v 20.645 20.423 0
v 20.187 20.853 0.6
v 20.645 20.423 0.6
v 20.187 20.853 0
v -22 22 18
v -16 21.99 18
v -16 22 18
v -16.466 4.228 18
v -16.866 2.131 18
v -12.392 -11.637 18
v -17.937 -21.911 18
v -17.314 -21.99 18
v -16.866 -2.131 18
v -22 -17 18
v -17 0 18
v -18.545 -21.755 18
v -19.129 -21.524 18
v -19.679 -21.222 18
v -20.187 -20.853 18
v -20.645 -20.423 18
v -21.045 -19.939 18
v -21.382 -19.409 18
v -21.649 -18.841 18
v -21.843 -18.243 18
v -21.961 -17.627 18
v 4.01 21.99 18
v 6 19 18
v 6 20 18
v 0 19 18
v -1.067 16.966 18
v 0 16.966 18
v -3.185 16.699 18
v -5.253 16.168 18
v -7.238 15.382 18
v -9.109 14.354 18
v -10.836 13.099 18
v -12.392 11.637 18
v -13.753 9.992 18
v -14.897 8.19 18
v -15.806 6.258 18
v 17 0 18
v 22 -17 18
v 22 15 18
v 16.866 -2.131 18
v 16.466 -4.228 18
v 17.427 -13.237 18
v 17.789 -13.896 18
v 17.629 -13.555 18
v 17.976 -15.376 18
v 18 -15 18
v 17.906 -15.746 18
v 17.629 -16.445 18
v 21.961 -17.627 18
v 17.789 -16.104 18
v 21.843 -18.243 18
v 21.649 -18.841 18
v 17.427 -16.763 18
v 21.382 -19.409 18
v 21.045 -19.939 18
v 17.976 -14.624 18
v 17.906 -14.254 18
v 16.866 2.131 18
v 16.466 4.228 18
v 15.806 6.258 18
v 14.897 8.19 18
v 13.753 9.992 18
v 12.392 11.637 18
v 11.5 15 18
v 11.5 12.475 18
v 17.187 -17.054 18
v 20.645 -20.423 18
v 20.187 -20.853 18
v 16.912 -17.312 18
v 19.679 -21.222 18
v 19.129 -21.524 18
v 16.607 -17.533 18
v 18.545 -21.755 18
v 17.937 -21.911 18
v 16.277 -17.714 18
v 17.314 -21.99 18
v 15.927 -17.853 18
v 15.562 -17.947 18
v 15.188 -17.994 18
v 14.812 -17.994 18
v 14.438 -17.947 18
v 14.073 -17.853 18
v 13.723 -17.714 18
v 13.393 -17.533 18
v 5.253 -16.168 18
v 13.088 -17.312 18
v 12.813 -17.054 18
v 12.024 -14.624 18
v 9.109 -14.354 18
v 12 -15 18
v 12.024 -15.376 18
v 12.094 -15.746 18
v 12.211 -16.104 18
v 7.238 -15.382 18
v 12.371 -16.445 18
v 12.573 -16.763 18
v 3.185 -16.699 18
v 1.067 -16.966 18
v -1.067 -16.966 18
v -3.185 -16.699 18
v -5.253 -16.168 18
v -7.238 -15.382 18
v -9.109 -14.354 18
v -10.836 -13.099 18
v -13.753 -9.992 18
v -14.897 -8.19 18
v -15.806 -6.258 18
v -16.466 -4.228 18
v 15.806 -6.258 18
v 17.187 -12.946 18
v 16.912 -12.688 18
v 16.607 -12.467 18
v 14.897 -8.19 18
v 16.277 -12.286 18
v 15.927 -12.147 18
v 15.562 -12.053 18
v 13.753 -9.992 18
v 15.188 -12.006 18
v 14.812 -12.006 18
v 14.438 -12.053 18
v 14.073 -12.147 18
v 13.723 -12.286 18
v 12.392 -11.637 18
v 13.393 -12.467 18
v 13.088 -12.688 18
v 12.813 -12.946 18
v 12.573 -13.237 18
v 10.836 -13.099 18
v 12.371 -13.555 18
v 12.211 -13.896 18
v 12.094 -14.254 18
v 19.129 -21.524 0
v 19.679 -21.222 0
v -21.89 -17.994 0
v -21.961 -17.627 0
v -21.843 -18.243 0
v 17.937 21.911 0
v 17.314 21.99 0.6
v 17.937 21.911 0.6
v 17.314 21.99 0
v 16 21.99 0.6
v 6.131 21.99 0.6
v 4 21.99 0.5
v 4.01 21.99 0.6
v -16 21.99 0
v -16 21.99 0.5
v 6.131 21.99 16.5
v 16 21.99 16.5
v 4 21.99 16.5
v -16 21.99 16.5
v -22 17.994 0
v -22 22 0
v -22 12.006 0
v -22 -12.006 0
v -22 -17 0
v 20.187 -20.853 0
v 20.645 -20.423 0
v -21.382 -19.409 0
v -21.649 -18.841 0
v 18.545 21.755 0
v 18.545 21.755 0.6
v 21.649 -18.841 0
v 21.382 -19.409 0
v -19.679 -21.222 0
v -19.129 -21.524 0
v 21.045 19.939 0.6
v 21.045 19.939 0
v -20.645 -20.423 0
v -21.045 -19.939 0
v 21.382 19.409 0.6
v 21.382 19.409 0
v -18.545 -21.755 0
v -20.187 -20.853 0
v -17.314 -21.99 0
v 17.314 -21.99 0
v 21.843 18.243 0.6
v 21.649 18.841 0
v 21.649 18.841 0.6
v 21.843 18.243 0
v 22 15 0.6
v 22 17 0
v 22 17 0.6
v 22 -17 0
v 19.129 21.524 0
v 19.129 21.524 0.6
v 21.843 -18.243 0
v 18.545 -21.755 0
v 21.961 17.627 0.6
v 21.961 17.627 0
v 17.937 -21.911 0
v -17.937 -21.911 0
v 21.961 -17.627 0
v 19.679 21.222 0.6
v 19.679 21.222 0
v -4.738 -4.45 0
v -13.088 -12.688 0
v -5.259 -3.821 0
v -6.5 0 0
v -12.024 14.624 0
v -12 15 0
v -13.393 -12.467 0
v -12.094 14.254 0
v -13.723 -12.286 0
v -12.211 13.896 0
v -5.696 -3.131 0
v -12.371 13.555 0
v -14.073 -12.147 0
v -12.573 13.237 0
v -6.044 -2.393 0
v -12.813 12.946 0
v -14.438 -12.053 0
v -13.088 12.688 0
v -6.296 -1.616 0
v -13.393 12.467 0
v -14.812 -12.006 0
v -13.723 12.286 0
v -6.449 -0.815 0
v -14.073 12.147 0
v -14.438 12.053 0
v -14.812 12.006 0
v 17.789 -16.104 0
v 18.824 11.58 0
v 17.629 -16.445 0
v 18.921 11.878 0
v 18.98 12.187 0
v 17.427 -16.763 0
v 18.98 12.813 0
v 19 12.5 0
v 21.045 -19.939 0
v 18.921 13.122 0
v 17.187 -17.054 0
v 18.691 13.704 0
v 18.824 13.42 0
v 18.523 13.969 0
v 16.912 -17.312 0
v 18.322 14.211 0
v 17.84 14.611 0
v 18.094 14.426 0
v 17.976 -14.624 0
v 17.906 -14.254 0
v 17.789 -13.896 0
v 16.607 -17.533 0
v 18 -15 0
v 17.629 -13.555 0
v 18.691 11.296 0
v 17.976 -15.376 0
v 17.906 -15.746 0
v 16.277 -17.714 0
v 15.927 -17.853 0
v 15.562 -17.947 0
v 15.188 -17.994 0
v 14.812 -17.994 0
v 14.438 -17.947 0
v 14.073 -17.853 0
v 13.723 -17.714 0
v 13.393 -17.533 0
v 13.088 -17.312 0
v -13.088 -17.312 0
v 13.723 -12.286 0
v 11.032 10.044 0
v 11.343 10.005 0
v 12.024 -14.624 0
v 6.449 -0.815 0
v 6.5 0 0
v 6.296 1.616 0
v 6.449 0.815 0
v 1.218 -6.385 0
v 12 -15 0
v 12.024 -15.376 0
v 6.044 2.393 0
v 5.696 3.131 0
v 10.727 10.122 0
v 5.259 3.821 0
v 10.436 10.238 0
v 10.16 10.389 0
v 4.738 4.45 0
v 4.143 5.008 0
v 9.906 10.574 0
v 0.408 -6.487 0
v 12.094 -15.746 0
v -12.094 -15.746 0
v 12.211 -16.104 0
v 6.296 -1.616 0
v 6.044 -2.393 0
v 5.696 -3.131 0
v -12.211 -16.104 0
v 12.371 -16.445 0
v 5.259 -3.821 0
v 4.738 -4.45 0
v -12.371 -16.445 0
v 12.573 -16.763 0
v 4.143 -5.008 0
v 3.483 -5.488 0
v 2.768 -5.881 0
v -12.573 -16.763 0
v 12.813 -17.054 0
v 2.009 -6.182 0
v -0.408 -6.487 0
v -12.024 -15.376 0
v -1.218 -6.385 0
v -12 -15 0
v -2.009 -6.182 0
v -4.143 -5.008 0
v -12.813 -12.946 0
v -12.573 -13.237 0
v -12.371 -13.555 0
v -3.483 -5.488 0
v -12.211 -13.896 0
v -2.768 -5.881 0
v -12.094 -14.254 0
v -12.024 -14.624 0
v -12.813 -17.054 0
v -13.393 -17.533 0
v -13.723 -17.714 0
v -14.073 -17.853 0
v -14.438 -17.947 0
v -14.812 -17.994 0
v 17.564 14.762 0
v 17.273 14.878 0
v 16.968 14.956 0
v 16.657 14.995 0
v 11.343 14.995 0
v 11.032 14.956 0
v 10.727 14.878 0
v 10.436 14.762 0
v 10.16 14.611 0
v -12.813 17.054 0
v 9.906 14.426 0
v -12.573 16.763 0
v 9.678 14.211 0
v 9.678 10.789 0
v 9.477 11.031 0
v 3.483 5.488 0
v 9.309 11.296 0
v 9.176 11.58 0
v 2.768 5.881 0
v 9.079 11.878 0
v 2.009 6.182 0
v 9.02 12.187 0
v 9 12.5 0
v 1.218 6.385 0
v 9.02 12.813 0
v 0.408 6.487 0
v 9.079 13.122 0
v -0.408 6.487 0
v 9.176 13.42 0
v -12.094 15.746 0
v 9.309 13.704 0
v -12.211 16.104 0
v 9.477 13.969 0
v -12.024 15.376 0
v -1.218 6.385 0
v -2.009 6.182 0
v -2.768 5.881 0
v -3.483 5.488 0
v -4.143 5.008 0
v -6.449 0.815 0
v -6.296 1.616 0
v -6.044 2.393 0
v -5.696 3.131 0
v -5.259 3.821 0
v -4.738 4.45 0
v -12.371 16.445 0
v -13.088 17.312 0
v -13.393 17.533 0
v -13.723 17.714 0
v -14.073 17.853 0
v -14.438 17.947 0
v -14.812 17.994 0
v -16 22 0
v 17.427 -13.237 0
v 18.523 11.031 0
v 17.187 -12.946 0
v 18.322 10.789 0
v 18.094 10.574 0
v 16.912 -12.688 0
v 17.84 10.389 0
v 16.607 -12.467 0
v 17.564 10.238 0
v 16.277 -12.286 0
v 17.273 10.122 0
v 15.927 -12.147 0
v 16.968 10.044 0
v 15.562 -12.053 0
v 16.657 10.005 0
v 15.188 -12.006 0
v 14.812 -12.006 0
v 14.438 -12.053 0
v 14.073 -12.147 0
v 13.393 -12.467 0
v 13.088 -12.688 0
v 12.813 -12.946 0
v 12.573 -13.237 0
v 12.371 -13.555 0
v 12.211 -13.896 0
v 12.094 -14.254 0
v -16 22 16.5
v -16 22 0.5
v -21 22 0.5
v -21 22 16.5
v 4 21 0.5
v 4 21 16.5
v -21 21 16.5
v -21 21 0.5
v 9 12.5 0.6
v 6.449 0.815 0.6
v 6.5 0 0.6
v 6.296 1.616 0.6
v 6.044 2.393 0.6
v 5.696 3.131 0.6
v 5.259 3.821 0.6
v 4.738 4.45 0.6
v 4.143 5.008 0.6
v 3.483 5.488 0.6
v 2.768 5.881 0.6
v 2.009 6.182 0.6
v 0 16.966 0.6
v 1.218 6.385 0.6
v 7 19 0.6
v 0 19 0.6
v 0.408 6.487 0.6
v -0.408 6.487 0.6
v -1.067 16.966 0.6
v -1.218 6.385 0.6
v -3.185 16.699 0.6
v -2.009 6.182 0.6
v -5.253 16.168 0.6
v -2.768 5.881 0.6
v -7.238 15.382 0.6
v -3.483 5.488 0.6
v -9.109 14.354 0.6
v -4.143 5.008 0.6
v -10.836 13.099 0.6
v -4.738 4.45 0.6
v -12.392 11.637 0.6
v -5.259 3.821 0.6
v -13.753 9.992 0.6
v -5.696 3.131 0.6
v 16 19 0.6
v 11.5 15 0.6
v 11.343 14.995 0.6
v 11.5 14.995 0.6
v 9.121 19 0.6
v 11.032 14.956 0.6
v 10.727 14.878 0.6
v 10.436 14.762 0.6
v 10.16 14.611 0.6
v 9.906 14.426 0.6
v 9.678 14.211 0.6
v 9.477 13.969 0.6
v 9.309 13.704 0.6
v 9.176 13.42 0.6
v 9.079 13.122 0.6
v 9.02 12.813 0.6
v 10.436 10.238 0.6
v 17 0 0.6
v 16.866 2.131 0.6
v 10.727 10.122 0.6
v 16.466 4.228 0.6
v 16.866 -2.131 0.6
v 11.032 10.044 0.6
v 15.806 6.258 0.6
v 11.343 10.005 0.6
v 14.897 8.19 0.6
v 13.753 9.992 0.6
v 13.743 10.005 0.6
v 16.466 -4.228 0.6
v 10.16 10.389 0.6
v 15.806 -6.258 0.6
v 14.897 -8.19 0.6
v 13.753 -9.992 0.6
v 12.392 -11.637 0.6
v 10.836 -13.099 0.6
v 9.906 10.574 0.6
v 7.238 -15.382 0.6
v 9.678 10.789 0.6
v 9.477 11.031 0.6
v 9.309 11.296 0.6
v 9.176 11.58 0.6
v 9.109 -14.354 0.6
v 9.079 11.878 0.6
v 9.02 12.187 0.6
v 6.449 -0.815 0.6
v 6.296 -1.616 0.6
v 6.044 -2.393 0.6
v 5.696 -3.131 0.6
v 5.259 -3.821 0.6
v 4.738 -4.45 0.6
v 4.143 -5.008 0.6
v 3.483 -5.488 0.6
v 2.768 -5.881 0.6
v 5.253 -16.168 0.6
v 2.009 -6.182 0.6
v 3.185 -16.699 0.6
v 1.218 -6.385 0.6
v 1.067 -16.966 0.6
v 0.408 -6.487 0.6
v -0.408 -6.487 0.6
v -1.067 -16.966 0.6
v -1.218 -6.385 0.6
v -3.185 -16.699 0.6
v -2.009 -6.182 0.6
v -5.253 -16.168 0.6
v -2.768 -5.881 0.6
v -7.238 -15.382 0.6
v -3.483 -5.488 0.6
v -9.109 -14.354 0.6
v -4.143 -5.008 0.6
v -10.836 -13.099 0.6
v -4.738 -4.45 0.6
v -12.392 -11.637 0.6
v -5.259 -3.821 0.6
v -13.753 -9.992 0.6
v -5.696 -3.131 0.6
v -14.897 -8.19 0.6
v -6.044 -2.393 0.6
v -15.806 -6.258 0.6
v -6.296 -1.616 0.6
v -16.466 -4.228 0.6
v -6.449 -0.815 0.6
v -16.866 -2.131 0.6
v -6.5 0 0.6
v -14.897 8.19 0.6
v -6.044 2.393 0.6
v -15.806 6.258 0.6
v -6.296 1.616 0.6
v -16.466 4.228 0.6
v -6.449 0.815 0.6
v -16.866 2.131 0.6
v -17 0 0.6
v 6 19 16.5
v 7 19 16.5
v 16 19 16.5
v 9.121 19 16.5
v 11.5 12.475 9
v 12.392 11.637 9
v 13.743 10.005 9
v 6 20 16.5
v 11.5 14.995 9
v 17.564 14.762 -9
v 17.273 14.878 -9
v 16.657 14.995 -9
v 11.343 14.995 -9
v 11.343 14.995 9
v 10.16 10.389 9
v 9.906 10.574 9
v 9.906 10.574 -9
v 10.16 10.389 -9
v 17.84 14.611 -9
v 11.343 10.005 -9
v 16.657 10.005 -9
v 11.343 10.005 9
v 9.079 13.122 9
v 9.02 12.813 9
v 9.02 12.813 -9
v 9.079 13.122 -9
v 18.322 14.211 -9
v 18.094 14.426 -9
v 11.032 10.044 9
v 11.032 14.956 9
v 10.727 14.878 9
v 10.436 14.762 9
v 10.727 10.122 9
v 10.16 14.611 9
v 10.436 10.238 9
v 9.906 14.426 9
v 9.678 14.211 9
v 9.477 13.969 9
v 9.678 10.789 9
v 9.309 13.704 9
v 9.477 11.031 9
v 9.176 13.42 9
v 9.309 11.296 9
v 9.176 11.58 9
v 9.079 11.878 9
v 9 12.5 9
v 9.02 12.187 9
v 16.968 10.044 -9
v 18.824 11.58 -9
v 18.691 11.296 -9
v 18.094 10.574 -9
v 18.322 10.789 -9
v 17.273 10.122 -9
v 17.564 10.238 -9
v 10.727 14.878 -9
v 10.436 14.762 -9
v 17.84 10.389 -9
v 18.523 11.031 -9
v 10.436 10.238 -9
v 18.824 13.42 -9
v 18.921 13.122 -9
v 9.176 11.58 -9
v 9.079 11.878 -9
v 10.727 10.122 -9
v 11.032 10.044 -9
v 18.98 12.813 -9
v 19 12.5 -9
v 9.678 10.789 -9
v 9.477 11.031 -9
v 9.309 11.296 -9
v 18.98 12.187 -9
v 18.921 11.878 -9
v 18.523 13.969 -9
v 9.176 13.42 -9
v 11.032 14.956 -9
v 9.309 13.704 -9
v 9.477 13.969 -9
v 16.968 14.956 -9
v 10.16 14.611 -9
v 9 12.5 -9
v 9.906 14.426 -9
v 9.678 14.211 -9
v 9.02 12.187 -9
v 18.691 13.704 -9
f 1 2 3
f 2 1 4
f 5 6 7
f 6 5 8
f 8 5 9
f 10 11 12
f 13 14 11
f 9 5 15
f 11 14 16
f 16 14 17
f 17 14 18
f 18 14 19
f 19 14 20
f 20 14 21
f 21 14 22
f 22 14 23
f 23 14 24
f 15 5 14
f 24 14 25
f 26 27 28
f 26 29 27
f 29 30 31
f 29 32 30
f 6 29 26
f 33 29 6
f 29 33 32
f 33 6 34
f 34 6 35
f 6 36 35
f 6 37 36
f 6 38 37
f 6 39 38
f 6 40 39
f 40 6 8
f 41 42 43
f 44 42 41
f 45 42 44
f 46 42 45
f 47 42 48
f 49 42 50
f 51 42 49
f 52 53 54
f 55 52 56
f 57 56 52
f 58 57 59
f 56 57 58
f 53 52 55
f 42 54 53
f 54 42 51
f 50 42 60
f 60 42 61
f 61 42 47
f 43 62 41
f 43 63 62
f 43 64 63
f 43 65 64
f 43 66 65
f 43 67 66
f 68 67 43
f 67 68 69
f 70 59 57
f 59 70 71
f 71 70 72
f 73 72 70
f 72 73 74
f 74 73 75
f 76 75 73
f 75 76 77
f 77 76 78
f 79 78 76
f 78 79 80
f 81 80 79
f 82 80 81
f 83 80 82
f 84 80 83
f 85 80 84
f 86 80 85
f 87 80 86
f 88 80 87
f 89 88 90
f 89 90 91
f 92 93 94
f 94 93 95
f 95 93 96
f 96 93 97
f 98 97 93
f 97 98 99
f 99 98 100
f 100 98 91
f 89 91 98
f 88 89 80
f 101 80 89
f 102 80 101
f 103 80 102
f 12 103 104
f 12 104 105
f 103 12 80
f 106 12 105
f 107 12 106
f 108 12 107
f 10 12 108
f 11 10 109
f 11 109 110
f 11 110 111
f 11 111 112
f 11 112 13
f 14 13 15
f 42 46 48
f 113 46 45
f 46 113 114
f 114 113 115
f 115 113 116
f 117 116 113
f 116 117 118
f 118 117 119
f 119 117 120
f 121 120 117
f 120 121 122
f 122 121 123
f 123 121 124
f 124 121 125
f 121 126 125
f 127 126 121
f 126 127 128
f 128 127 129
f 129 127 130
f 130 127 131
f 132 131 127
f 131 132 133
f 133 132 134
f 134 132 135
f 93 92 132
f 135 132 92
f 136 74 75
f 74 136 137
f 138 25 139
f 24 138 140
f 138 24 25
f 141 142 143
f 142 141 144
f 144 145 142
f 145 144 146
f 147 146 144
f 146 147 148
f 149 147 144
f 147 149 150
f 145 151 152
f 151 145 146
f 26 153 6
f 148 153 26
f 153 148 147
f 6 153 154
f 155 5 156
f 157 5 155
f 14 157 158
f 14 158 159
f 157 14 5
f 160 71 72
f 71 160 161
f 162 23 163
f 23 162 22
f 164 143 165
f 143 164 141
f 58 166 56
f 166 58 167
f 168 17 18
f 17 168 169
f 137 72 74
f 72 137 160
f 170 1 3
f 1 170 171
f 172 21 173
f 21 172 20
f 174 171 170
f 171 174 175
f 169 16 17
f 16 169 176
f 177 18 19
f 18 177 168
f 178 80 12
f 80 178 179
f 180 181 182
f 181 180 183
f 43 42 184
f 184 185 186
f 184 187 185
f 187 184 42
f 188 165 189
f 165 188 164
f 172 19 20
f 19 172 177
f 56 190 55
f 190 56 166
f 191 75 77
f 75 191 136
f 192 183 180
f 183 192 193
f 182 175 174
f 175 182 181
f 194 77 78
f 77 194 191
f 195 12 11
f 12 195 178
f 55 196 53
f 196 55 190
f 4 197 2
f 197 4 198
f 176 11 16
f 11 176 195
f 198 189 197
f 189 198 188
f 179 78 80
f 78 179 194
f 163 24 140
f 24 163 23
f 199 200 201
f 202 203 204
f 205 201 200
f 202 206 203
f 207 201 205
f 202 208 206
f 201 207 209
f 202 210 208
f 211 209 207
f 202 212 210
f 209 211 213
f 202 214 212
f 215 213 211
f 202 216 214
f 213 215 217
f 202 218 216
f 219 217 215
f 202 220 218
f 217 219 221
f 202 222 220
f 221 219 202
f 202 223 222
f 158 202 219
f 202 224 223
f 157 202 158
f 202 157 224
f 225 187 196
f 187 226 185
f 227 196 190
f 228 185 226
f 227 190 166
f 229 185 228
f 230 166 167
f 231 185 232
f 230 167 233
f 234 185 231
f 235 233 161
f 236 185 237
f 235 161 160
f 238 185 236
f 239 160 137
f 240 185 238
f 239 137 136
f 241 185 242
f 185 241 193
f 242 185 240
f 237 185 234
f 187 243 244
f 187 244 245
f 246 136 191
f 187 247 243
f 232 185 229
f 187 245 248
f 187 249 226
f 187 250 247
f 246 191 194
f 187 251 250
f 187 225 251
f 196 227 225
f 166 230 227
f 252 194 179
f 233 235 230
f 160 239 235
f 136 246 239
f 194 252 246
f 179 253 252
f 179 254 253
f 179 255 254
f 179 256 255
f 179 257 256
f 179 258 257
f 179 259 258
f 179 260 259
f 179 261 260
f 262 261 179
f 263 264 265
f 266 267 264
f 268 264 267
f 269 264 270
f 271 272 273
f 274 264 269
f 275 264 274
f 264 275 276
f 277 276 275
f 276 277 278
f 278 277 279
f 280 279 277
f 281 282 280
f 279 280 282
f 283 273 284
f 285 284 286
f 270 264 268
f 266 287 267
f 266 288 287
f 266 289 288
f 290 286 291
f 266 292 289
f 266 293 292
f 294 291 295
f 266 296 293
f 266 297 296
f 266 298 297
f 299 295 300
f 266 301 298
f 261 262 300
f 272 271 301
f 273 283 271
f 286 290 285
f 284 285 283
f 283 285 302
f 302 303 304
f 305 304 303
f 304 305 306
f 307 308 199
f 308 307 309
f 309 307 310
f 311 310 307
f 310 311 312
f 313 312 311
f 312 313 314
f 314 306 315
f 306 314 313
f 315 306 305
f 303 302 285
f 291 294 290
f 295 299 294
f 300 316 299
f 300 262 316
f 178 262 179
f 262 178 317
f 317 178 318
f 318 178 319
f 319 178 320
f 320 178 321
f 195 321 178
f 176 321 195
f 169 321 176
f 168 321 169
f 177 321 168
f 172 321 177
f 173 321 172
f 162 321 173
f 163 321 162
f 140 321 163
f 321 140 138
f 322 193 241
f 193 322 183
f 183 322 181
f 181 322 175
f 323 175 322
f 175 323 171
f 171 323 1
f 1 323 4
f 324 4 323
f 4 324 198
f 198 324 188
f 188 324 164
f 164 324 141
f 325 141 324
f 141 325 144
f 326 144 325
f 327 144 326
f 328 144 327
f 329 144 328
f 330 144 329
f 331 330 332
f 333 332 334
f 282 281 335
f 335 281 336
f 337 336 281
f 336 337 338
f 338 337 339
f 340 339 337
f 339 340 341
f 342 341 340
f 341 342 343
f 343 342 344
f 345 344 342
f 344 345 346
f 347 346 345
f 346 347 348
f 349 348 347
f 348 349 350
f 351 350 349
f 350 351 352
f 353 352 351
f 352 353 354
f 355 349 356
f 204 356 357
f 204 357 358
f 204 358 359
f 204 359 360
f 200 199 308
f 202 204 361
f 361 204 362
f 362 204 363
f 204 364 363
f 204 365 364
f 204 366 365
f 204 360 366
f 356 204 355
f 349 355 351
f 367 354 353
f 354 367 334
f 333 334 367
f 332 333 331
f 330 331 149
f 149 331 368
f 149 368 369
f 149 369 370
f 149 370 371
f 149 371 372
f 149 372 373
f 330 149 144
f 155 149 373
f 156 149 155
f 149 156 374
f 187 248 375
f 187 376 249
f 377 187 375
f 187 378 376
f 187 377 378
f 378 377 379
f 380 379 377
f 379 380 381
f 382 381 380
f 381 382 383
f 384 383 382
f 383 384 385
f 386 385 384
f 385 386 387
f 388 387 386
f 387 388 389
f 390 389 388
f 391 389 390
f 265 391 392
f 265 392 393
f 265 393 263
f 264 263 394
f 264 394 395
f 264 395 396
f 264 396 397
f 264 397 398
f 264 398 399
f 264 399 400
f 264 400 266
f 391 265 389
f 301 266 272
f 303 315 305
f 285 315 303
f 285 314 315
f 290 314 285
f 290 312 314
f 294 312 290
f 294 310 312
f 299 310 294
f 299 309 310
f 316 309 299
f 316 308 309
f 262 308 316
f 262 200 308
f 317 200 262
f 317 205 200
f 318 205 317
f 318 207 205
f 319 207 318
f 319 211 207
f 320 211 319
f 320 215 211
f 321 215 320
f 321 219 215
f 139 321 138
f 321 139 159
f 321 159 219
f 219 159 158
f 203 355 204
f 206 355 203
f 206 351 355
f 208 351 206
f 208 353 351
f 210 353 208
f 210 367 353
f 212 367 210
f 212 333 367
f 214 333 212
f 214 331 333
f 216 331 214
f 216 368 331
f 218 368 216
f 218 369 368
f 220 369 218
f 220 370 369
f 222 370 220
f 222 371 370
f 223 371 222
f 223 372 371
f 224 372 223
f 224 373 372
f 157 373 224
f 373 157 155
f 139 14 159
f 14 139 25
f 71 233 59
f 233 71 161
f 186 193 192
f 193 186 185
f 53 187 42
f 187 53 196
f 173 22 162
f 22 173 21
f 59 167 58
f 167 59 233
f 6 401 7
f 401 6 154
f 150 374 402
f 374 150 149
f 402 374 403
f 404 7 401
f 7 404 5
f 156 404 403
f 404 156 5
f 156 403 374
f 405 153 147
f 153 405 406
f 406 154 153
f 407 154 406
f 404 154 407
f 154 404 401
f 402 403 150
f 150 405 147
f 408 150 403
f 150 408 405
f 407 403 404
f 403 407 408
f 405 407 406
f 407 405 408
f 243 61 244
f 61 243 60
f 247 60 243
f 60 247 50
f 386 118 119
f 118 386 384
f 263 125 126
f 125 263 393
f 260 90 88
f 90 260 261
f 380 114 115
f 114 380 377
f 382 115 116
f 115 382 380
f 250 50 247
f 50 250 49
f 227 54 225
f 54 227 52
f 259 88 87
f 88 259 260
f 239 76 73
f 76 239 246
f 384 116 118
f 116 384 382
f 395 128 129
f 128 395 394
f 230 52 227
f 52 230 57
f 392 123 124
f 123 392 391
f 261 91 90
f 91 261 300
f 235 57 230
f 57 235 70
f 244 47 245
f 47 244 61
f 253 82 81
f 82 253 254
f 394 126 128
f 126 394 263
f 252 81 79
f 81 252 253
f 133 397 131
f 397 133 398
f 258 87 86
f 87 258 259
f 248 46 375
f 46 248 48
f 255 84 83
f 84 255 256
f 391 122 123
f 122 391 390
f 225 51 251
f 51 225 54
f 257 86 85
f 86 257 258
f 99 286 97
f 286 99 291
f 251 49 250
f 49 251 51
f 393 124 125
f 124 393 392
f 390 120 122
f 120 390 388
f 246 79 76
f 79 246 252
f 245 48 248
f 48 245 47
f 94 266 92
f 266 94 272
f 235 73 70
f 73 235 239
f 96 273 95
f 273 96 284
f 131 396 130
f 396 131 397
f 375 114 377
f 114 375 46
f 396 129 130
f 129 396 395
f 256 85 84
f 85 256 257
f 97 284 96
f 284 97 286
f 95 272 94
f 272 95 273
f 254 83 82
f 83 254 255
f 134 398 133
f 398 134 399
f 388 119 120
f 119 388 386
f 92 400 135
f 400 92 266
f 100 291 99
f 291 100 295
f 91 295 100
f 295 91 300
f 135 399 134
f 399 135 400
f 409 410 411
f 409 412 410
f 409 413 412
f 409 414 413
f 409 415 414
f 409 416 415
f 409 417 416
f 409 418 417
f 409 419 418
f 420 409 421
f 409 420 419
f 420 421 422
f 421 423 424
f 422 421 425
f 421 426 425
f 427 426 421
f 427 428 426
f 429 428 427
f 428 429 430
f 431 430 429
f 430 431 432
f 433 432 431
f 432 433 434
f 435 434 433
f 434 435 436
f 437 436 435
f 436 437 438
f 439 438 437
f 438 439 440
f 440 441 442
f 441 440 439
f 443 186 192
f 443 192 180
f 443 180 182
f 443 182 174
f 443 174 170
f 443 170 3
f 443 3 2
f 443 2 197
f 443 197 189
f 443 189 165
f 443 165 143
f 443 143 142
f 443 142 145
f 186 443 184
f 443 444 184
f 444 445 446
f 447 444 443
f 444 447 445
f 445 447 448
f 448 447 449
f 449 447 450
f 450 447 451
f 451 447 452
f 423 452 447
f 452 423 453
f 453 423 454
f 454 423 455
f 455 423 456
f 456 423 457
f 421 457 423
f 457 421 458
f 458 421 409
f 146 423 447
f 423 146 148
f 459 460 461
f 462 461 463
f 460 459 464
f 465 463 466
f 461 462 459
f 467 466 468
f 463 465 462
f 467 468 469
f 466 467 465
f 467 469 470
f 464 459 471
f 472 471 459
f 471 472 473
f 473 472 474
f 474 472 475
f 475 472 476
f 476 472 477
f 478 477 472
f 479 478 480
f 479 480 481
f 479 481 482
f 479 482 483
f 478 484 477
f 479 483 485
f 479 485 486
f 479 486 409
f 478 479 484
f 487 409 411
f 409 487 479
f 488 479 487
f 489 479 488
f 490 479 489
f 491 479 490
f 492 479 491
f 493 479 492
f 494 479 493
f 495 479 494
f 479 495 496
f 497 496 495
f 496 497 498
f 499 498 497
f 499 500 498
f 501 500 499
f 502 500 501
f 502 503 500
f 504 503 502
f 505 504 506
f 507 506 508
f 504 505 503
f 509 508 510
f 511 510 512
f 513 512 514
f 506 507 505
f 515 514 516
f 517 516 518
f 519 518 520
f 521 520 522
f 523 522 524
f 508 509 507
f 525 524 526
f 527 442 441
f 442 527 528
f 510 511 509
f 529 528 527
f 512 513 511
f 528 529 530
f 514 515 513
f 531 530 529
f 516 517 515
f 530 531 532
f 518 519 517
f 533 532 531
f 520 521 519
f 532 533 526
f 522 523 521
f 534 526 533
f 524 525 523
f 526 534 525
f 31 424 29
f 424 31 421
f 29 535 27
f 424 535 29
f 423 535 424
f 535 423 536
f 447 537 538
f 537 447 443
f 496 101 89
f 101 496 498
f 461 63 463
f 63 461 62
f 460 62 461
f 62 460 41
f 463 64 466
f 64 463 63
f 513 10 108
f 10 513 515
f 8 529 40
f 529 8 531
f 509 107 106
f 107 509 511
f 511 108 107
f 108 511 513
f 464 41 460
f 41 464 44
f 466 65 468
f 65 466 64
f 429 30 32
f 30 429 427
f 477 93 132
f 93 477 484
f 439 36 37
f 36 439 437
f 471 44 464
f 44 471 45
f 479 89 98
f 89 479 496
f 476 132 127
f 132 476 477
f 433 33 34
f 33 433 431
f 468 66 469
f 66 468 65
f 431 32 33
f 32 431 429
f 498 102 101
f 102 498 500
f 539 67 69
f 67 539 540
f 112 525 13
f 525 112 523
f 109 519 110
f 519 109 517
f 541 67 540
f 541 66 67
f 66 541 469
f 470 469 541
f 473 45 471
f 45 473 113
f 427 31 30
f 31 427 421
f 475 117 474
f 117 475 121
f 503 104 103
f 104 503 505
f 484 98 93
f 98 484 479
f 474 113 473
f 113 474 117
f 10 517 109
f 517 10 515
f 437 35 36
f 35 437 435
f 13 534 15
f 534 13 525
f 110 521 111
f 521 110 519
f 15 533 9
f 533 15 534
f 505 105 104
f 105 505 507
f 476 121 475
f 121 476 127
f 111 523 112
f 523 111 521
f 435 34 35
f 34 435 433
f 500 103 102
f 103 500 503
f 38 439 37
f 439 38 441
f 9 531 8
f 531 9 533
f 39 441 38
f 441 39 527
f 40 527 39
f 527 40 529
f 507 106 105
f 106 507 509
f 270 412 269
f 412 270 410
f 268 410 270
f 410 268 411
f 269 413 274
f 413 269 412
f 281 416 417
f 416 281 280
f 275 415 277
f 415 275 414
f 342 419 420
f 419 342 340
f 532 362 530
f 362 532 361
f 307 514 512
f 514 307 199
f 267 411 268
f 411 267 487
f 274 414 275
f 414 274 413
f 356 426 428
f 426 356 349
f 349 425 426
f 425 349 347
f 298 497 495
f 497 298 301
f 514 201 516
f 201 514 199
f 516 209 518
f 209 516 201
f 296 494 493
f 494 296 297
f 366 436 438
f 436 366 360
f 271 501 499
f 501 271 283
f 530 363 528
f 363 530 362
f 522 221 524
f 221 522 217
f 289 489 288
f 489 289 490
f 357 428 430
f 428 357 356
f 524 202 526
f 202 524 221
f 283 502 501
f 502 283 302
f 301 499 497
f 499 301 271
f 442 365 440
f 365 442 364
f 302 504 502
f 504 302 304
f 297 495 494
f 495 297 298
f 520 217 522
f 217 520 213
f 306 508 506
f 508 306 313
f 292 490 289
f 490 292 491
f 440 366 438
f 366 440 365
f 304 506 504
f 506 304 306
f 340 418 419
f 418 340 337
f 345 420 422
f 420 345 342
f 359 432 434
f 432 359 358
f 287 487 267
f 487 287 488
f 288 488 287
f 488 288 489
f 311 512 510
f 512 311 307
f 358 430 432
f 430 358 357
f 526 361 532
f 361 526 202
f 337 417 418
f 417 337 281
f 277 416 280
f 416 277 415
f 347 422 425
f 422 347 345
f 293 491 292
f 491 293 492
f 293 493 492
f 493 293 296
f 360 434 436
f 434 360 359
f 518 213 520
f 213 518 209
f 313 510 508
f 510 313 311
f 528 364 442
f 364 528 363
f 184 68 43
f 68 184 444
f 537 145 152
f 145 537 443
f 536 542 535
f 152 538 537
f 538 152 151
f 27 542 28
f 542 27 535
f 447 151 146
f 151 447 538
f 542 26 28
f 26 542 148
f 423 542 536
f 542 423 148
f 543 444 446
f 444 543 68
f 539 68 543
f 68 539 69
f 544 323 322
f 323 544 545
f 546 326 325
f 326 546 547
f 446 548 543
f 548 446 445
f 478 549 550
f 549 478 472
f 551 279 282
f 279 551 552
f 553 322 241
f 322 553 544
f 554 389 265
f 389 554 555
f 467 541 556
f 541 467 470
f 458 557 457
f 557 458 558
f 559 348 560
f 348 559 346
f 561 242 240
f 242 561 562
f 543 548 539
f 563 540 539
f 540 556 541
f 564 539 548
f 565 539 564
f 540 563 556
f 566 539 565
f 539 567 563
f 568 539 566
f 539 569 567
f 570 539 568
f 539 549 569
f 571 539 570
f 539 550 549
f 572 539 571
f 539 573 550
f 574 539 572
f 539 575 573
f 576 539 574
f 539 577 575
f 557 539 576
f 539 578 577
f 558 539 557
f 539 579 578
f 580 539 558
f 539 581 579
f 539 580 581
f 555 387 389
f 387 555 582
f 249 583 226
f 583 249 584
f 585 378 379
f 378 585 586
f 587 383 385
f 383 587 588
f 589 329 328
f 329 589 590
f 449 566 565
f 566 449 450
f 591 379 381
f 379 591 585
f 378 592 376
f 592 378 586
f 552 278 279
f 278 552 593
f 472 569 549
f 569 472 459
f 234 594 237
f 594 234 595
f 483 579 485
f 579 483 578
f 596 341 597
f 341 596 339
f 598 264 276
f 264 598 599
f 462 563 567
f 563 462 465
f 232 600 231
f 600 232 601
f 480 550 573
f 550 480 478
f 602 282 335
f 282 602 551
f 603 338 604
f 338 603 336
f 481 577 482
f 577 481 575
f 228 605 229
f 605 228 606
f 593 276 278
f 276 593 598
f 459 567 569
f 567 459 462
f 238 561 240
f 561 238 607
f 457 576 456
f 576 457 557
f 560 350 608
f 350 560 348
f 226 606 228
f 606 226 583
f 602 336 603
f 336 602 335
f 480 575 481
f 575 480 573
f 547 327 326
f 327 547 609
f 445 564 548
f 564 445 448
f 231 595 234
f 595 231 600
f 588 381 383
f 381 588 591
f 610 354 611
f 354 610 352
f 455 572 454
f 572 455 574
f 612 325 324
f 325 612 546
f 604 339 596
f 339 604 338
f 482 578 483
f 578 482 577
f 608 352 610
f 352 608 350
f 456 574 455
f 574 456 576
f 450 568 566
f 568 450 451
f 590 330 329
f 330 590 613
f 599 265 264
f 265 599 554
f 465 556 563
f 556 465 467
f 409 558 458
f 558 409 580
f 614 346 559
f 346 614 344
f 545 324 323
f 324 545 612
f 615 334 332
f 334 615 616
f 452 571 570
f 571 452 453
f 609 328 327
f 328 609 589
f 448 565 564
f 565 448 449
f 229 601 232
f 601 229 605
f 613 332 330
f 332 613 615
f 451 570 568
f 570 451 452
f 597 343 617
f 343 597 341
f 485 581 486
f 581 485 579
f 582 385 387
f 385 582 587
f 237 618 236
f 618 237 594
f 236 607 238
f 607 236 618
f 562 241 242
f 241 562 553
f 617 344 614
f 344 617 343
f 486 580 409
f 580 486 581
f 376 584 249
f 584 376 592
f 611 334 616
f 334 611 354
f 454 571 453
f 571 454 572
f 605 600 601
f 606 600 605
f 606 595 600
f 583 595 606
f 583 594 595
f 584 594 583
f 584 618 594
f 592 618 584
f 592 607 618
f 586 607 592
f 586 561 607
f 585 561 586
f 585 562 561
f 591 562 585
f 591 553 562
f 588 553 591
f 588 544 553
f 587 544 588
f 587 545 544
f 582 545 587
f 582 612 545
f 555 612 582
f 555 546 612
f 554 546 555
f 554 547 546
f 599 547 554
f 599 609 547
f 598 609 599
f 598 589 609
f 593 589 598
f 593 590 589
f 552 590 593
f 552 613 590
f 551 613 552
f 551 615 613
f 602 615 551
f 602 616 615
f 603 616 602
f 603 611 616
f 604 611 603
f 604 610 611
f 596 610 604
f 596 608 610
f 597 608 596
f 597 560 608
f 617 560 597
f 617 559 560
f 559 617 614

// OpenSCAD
$fn = 50;


union() {
	difference() {
		union() {
			hull() {
				translate(v = [-17.0000000000, 17.0000000000, 0]) {
					cylinder(h = 18, r = 5);
				}
				translate(v = [17.0000000000, 17.0000000000, 0]) {
					cylinder(h = 18, r = 5);
				}
				translate(v = [-17.0000000000, -17.0000000000, 0]) {
					cylinder(h = 18, r = 5);
				}
				translate(v = [17.0000000000, -17.0000000000, 0]) {
					cylinder(h = 18, r = 5);
				}
			}
			translate(v = [-22.0000000000, 16.0000000000, 0]) {
				cube(size = [6, 6, 18]);
			}
		}
		union() {
			translate(v = [-22.5000000000, -15.0000000000, -250.0000000000]) {
				rotate(a = [0, 0, 0]) {
					difference() {
						union() {
							hull() {
								translate(v = [7.5000000000, 0, 0]) {
									cylinder(h = 250, r = 3.0000000000, r1 = 3.0000000000, r2 = 3.0000000000);
								}
								translate(v = [-7.5000000000, 0, 0]) {
									cylinder(h = 250, r = 3.0000000000, r1 = 3.0000000000, r2 = 3.0000000000);
								}
							}
						}
						union();
					}
				}
			}
			translate(v = [-22.5000000000, 15.0000000000, -250.0000000000]) {
				rotate(a = [0, 0, 0]) {
					difference() {
						union() {
							hull() {
								translate(v = [7.5000000000, 0, 0]) {
									cylinder(h = 250, r = 3.0000000000, r1 = 3.0000000000, r2 = 3.0000000000);
								}
								translate(v = [-7.5000000000, 0, 0]) {
									cylinder(h = 250, r = 3.0000000000, r1 = 3.0000000000, r2 = 3.0000000000);
								}
							}
						}
						union();
					}
				}
			}
			translate(v = [-21.0000000000, 21.0000000000, 0.5000000000]) {
				cube(size = [25, 1, 16]);
			}
			translate(v = [15.0000000000, -15.0000000000, 0]) {
				cylinder(h = 100, r = 3.0000000000);
			}
			translate(v = [0.0000000000, 11.0000000000, 0.6000000000]) {
				cube(size = [11, 8, 20.4000000000]);
			}
			translate(v = [0, 0, 0.6000000000]) {
				cylinder(h = 20.4000000000, r = 17.0000000000);
			}
			translate(v = [0, 0, -9.0000000000]) {
				cylinder(h = 18, r = 6.5000000000);
			}
			translate(v = [0.0000000000, 15.0000000000, 0.6000000000]) {
				cube(size = [22.0000000000, 4, 20.4000000000]);
			}
			translate(v = [16.0000000000, 15.0000000000, 0.6000000000]) {
				cube(size = [6, 7, 20.4000000000]);
			}
			translate(v = [6.0000000000, 15.0000000000, 16.5000000000]) {
				cube(size = [16, 7, 1.5000000000]);
			}
			translate(v = [3.2500000000, 22.7500000000, 0.6000000000]) {
				rotate(a = [0, 0, -45]) {
					cube(size = [7.5000000000, 1.5000000000, 20.4000000000]);
				}
			}
			translate(v = [2.5000000000, 10.0000000000, 0.6000000000]) {
				cube(size = [9.0000000000, 5, 17.4000000000]);
			}
		}
	}
	union() {
		translate(v = [14, 12.5000000000, -9.0000000000]) {
			rotate(a = [0, 0, 0]) {
				difference() {
					union() {
						#hull() {
							#translate(v = [2.5000000000, 0, 0]) {
								cylinder(h = 18, r = 2.5000000000, r1 = 2.5000000000, r2 = 2.5000000000);
							}
							#translate(v = [-2.5000000000, 0, 0]) {
								cylinder(h = 18, r = 2.5000000000, r1 = 2.5000000000, r2 = 2.5000000000);
							}
						}
					}
					union();
				}
			}
		}
	}
}
